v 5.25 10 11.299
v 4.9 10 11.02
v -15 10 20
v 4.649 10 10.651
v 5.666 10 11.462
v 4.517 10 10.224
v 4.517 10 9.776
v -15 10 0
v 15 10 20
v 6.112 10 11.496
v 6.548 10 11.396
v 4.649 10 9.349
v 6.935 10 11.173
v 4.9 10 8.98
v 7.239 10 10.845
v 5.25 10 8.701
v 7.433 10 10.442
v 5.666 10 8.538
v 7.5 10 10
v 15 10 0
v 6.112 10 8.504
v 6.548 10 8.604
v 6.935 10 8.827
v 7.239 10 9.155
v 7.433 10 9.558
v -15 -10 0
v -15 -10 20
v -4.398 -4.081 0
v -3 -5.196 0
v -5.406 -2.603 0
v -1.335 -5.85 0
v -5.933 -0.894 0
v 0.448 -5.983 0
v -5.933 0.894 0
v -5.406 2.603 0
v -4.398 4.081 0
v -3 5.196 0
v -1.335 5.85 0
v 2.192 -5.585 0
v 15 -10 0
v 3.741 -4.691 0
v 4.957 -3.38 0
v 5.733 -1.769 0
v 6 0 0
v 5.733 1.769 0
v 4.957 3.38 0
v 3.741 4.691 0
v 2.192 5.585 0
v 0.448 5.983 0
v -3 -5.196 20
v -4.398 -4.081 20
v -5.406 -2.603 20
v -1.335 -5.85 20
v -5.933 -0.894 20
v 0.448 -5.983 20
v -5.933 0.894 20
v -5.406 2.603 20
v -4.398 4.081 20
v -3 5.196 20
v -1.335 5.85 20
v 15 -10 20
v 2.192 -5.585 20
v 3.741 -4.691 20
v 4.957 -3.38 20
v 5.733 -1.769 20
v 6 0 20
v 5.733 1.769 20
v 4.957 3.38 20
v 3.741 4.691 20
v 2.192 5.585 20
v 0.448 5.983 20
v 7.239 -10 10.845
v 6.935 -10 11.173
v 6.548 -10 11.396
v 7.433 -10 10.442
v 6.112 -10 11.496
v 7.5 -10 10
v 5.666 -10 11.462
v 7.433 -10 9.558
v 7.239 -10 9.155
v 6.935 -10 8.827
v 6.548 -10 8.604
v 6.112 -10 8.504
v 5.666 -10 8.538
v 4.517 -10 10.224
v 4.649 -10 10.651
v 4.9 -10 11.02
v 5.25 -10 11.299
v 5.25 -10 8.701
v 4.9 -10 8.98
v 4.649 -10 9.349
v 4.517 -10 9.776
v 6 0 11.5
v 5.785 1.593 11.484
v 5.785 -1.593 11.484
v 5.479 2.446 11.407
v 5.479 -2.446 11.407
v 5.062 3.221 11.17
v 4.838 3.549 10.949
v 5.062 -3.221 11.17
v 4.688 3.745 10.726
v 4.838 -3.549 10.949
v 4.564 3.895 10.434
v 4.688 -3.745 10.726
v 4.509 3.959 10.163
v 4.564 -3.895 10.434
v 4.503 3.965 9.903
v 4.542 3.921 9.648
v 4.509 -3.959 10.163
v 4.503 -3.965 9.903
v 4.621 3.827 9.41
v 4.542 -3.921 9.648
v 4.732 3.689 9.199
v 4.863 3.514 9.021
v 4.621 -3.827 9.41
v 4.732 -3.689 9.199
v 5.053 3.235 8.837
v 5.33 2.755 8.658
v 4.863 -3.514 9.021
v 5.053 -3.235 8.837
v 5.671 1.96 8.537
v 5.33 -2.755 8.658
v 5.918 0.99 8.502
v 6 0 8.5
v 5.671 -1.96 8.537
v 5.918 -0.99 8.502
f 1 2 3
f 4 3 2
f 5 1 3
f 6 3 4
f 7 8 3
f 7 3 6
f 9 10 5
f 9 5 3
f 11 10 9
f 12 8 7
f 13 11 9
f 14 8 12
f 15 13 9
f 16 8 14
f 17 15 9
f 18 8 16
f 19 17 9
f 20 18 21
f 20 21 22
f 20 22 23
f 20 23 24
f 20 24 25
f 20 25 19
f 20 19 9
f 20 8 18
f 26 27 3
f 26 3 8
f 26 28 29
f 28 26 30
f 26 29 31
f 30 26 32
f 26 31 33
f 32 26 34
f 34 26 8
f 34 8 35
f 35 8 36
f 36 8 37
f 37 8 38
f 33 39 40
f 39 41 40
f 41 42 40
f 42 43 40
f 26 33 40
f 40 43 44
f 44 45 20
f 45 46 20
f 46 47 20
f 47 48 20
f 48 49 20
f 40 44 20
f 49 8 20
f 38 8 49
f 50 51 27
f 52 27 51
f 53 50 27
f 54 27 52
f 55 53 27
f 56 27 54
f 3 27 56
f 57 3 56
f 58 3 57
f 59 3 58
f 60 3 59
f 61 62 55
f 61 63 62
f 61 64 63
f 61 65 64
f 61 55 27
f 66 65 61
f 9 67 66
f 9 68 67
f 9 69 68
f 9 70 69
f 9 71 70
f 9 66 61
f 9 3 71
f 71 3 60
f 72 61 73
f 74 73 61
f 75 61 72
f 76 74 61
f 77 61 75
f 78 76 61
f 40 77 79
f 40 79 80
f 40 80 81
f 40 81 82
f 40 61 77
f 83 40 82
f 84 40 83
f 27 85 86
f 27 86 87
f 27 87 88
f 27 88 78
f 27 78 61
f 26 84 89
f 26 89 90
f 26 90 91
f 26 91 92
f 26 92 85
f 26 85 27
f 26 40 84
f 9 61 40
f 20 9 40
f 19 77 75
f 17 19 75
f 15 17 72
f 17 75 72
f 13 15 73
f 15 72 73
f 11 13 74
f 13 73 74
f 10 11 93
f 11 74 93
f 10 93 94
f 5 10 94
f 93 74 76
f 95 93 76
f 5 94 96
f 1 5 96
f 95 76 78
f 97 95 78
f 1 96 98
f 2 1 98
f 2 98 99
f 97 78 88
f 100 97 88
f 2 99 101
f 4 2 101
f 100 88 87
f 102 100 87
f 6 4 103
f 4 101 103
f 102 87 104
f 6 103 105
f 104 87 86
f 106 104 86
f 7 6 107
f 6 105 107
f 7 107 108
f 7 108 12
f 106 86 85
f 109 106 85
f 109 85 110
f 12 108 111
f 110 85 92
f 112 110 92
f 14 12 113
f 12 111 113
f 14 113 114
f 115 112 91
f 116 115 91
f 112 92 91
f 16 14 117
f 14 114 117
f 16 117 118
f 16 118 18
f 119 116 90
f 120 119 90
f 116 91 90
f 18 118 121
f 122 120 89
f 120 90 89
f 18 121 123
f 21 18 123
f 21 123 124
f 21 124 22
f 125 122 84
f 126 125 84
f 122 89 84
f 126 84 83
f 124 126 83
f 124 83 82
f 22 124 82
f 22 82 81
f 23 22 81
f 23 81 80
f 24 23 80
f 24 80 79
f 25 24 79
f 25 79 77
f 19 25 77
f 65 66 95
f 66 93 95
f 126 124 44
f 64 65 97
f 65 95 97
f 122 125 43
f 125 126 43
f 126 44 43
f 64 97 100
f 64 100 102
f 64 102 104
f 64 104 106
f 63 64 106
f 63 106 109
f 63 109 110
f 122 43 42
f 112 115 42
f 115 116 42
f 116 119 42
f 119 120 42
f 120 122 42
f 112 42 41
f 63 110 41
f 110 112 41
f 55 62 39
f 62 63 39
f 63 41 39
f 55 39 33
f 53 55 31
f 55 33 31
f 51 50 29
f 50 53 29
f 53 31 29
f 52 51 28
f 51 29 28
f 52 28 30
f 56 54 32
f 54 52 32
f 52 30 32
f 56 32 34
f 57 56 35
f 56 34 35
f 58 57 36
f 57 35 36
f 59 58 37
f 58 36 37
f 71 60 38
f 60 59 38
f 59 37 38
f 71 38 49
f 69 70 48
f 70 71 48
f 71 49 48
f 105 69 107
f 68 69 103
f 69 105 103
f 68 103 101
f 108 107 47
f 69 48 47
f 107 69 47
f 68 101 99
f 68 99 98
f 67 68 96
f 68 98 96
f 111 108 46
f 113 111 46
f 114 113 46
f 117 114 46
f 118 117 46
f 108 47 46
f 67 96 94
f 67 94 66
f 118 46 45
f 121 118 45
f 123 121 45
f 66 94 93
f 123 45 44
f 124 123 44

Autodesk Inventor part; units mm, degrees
ref_plane "YZ Plane" through (0, 0, 0) normal (1, 0, 0) x (0, 1, 0)
ref_plane "XZ Plane" through (0, 0, 0) normal (0, 1, 0) x (-1, 0, 0)
ref_plane "XY Plane" through (0, 0, 0) normal (0, 0, 1) x (1, 0, 0)
sketch "Sketch1" plane through (0, 0, 0) normal (0, 0, 1) x (1, 0, 0)
  circle A0 centre (0, 0) radius 6
  line L0 (10, 10) -> (10, -10)
  line L1 (10, -10) -> (-10, -10)
  line L2 (-10, -10) -> (-10, 10)
  line L3 (-10, 10) -> (10, 10)
  dimension "d0" = 12
  dimension "d1" = 20
extrude "Extrusion1" add sketch "Sketch1" along normal blind 20
sketch "Sketch2" plane through (-10, -10, 0) normal (0, -1, 0) x (1, 0, 0)
  line L0 (7.9561, 12.9375) -> (13.8857, 12.9375) construction
  line L1 (13.8857, 12.9375) -> (13.8857, 9.2988) construction
  line L2 (13.8857, 9.2988) -> (7.9561, 9.2988) construction
  line L3 (7.9561, 9.2988) -> (7.9561, 12.9375) construction
  point P0 (10, 0)
sketch "Sketch3" plane through (-10, -10, 0) normal (0, -1, 0) x (1, 0, 0)
  line L0 (0, 0) -> (0, 20) projected
  line L1 (20, 0) -> (20, 20) projected
  line L2 (0, 20) -> (-5, 20)
  line L3 (-5, 20) -> (-5, 0)
  line L4 (-5, 0) -> (0, 0)
  line L5 (0, 0) -> (0, 20)
  line L6 (20, 0) -> (20, 20) projected
  line L7 (20, 20) -> (25, 20)
  line L8 (25, 20) -> (25, 0)
  line L9 (25, 0) -> (20, 0)
  line L10 (20, 0) -> (20, 20)
  point P0 (10, 0)
  dimension "d4" = 30
extrude "Extrusion2" add sketch "Sketch3" against normal up to surface (20 mm away)
sketch "Sketch4" plane through (-15, -10, 0) normal (0, -1, 0) x (1, 0, 0)
  line L0 (21, 0) -> (21, 20) projected
  line L1 (9, 0) -> (9, 20) projected
  circle A0 centre (21, 10) radius 1.5
  point P0 (15, 0)
  dimension "d7" = 3
extrude "Extrusion3" cut sketch "Sketch4" against normal through all
properties part number "Bearing10" material "Acero, carbono"
